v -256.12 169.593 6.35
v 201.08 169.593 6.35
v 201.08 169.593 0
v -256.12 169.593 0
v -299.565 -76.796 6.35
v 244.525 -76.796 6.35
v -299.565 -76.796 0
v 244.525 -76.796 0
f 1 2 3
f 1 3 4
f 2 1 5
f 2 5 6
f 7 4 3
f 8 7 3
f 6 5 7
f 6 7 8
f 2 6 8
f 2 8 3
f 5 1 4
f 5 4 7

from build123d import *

# Parameters (mm, degrees)
F1_DEPTH = 12.7
F2_DEPTH = 6.35
F3_DEPTH = 6.35
F4_DEPTH = 6.35


with BuildPart() as f1:
    # F0 (on Top) → F1 (new body)
    with BuildSketch(Plane.XY):
        Polygon((201.0800465941, 169.5929964036), (-256.1199534059, 169.5929964036), (-299.5649909763, -76.7960553225), (244.5250841646, -76.7960553225), align=None)
    extrude(amount=F1_DEPTH)

    # F2 (add): a face of the model
    f2_faces = [f1.faces().sort_by_distance(p)[0] for p in [
        (-27.5199534059, 42.8349405589, 12.7),
    ]]
    extrude(f2_faces, amount=-F2_DEPTH)

    # F3 (add): a face of the model
    f3_faces = [f1.faces().sort_by_distance(p)[0] for p in [
        (-27.5199534059, 42.8349405589, 12.7),
    ]]
    extrude(f3_faces, amount=-F3_DEPTH)

    # F4 (cut): a face of the model
    f4_faces = [f1.faces().sort_by_distance(p)[0] for p in [
        (-27.5199534059, 42.8349405589, 12.7),
    ]]
    extrude(f4_faces, amount=-F4_DEPTH, mode=Mode.SUBTRACT)


solid = f1.part
